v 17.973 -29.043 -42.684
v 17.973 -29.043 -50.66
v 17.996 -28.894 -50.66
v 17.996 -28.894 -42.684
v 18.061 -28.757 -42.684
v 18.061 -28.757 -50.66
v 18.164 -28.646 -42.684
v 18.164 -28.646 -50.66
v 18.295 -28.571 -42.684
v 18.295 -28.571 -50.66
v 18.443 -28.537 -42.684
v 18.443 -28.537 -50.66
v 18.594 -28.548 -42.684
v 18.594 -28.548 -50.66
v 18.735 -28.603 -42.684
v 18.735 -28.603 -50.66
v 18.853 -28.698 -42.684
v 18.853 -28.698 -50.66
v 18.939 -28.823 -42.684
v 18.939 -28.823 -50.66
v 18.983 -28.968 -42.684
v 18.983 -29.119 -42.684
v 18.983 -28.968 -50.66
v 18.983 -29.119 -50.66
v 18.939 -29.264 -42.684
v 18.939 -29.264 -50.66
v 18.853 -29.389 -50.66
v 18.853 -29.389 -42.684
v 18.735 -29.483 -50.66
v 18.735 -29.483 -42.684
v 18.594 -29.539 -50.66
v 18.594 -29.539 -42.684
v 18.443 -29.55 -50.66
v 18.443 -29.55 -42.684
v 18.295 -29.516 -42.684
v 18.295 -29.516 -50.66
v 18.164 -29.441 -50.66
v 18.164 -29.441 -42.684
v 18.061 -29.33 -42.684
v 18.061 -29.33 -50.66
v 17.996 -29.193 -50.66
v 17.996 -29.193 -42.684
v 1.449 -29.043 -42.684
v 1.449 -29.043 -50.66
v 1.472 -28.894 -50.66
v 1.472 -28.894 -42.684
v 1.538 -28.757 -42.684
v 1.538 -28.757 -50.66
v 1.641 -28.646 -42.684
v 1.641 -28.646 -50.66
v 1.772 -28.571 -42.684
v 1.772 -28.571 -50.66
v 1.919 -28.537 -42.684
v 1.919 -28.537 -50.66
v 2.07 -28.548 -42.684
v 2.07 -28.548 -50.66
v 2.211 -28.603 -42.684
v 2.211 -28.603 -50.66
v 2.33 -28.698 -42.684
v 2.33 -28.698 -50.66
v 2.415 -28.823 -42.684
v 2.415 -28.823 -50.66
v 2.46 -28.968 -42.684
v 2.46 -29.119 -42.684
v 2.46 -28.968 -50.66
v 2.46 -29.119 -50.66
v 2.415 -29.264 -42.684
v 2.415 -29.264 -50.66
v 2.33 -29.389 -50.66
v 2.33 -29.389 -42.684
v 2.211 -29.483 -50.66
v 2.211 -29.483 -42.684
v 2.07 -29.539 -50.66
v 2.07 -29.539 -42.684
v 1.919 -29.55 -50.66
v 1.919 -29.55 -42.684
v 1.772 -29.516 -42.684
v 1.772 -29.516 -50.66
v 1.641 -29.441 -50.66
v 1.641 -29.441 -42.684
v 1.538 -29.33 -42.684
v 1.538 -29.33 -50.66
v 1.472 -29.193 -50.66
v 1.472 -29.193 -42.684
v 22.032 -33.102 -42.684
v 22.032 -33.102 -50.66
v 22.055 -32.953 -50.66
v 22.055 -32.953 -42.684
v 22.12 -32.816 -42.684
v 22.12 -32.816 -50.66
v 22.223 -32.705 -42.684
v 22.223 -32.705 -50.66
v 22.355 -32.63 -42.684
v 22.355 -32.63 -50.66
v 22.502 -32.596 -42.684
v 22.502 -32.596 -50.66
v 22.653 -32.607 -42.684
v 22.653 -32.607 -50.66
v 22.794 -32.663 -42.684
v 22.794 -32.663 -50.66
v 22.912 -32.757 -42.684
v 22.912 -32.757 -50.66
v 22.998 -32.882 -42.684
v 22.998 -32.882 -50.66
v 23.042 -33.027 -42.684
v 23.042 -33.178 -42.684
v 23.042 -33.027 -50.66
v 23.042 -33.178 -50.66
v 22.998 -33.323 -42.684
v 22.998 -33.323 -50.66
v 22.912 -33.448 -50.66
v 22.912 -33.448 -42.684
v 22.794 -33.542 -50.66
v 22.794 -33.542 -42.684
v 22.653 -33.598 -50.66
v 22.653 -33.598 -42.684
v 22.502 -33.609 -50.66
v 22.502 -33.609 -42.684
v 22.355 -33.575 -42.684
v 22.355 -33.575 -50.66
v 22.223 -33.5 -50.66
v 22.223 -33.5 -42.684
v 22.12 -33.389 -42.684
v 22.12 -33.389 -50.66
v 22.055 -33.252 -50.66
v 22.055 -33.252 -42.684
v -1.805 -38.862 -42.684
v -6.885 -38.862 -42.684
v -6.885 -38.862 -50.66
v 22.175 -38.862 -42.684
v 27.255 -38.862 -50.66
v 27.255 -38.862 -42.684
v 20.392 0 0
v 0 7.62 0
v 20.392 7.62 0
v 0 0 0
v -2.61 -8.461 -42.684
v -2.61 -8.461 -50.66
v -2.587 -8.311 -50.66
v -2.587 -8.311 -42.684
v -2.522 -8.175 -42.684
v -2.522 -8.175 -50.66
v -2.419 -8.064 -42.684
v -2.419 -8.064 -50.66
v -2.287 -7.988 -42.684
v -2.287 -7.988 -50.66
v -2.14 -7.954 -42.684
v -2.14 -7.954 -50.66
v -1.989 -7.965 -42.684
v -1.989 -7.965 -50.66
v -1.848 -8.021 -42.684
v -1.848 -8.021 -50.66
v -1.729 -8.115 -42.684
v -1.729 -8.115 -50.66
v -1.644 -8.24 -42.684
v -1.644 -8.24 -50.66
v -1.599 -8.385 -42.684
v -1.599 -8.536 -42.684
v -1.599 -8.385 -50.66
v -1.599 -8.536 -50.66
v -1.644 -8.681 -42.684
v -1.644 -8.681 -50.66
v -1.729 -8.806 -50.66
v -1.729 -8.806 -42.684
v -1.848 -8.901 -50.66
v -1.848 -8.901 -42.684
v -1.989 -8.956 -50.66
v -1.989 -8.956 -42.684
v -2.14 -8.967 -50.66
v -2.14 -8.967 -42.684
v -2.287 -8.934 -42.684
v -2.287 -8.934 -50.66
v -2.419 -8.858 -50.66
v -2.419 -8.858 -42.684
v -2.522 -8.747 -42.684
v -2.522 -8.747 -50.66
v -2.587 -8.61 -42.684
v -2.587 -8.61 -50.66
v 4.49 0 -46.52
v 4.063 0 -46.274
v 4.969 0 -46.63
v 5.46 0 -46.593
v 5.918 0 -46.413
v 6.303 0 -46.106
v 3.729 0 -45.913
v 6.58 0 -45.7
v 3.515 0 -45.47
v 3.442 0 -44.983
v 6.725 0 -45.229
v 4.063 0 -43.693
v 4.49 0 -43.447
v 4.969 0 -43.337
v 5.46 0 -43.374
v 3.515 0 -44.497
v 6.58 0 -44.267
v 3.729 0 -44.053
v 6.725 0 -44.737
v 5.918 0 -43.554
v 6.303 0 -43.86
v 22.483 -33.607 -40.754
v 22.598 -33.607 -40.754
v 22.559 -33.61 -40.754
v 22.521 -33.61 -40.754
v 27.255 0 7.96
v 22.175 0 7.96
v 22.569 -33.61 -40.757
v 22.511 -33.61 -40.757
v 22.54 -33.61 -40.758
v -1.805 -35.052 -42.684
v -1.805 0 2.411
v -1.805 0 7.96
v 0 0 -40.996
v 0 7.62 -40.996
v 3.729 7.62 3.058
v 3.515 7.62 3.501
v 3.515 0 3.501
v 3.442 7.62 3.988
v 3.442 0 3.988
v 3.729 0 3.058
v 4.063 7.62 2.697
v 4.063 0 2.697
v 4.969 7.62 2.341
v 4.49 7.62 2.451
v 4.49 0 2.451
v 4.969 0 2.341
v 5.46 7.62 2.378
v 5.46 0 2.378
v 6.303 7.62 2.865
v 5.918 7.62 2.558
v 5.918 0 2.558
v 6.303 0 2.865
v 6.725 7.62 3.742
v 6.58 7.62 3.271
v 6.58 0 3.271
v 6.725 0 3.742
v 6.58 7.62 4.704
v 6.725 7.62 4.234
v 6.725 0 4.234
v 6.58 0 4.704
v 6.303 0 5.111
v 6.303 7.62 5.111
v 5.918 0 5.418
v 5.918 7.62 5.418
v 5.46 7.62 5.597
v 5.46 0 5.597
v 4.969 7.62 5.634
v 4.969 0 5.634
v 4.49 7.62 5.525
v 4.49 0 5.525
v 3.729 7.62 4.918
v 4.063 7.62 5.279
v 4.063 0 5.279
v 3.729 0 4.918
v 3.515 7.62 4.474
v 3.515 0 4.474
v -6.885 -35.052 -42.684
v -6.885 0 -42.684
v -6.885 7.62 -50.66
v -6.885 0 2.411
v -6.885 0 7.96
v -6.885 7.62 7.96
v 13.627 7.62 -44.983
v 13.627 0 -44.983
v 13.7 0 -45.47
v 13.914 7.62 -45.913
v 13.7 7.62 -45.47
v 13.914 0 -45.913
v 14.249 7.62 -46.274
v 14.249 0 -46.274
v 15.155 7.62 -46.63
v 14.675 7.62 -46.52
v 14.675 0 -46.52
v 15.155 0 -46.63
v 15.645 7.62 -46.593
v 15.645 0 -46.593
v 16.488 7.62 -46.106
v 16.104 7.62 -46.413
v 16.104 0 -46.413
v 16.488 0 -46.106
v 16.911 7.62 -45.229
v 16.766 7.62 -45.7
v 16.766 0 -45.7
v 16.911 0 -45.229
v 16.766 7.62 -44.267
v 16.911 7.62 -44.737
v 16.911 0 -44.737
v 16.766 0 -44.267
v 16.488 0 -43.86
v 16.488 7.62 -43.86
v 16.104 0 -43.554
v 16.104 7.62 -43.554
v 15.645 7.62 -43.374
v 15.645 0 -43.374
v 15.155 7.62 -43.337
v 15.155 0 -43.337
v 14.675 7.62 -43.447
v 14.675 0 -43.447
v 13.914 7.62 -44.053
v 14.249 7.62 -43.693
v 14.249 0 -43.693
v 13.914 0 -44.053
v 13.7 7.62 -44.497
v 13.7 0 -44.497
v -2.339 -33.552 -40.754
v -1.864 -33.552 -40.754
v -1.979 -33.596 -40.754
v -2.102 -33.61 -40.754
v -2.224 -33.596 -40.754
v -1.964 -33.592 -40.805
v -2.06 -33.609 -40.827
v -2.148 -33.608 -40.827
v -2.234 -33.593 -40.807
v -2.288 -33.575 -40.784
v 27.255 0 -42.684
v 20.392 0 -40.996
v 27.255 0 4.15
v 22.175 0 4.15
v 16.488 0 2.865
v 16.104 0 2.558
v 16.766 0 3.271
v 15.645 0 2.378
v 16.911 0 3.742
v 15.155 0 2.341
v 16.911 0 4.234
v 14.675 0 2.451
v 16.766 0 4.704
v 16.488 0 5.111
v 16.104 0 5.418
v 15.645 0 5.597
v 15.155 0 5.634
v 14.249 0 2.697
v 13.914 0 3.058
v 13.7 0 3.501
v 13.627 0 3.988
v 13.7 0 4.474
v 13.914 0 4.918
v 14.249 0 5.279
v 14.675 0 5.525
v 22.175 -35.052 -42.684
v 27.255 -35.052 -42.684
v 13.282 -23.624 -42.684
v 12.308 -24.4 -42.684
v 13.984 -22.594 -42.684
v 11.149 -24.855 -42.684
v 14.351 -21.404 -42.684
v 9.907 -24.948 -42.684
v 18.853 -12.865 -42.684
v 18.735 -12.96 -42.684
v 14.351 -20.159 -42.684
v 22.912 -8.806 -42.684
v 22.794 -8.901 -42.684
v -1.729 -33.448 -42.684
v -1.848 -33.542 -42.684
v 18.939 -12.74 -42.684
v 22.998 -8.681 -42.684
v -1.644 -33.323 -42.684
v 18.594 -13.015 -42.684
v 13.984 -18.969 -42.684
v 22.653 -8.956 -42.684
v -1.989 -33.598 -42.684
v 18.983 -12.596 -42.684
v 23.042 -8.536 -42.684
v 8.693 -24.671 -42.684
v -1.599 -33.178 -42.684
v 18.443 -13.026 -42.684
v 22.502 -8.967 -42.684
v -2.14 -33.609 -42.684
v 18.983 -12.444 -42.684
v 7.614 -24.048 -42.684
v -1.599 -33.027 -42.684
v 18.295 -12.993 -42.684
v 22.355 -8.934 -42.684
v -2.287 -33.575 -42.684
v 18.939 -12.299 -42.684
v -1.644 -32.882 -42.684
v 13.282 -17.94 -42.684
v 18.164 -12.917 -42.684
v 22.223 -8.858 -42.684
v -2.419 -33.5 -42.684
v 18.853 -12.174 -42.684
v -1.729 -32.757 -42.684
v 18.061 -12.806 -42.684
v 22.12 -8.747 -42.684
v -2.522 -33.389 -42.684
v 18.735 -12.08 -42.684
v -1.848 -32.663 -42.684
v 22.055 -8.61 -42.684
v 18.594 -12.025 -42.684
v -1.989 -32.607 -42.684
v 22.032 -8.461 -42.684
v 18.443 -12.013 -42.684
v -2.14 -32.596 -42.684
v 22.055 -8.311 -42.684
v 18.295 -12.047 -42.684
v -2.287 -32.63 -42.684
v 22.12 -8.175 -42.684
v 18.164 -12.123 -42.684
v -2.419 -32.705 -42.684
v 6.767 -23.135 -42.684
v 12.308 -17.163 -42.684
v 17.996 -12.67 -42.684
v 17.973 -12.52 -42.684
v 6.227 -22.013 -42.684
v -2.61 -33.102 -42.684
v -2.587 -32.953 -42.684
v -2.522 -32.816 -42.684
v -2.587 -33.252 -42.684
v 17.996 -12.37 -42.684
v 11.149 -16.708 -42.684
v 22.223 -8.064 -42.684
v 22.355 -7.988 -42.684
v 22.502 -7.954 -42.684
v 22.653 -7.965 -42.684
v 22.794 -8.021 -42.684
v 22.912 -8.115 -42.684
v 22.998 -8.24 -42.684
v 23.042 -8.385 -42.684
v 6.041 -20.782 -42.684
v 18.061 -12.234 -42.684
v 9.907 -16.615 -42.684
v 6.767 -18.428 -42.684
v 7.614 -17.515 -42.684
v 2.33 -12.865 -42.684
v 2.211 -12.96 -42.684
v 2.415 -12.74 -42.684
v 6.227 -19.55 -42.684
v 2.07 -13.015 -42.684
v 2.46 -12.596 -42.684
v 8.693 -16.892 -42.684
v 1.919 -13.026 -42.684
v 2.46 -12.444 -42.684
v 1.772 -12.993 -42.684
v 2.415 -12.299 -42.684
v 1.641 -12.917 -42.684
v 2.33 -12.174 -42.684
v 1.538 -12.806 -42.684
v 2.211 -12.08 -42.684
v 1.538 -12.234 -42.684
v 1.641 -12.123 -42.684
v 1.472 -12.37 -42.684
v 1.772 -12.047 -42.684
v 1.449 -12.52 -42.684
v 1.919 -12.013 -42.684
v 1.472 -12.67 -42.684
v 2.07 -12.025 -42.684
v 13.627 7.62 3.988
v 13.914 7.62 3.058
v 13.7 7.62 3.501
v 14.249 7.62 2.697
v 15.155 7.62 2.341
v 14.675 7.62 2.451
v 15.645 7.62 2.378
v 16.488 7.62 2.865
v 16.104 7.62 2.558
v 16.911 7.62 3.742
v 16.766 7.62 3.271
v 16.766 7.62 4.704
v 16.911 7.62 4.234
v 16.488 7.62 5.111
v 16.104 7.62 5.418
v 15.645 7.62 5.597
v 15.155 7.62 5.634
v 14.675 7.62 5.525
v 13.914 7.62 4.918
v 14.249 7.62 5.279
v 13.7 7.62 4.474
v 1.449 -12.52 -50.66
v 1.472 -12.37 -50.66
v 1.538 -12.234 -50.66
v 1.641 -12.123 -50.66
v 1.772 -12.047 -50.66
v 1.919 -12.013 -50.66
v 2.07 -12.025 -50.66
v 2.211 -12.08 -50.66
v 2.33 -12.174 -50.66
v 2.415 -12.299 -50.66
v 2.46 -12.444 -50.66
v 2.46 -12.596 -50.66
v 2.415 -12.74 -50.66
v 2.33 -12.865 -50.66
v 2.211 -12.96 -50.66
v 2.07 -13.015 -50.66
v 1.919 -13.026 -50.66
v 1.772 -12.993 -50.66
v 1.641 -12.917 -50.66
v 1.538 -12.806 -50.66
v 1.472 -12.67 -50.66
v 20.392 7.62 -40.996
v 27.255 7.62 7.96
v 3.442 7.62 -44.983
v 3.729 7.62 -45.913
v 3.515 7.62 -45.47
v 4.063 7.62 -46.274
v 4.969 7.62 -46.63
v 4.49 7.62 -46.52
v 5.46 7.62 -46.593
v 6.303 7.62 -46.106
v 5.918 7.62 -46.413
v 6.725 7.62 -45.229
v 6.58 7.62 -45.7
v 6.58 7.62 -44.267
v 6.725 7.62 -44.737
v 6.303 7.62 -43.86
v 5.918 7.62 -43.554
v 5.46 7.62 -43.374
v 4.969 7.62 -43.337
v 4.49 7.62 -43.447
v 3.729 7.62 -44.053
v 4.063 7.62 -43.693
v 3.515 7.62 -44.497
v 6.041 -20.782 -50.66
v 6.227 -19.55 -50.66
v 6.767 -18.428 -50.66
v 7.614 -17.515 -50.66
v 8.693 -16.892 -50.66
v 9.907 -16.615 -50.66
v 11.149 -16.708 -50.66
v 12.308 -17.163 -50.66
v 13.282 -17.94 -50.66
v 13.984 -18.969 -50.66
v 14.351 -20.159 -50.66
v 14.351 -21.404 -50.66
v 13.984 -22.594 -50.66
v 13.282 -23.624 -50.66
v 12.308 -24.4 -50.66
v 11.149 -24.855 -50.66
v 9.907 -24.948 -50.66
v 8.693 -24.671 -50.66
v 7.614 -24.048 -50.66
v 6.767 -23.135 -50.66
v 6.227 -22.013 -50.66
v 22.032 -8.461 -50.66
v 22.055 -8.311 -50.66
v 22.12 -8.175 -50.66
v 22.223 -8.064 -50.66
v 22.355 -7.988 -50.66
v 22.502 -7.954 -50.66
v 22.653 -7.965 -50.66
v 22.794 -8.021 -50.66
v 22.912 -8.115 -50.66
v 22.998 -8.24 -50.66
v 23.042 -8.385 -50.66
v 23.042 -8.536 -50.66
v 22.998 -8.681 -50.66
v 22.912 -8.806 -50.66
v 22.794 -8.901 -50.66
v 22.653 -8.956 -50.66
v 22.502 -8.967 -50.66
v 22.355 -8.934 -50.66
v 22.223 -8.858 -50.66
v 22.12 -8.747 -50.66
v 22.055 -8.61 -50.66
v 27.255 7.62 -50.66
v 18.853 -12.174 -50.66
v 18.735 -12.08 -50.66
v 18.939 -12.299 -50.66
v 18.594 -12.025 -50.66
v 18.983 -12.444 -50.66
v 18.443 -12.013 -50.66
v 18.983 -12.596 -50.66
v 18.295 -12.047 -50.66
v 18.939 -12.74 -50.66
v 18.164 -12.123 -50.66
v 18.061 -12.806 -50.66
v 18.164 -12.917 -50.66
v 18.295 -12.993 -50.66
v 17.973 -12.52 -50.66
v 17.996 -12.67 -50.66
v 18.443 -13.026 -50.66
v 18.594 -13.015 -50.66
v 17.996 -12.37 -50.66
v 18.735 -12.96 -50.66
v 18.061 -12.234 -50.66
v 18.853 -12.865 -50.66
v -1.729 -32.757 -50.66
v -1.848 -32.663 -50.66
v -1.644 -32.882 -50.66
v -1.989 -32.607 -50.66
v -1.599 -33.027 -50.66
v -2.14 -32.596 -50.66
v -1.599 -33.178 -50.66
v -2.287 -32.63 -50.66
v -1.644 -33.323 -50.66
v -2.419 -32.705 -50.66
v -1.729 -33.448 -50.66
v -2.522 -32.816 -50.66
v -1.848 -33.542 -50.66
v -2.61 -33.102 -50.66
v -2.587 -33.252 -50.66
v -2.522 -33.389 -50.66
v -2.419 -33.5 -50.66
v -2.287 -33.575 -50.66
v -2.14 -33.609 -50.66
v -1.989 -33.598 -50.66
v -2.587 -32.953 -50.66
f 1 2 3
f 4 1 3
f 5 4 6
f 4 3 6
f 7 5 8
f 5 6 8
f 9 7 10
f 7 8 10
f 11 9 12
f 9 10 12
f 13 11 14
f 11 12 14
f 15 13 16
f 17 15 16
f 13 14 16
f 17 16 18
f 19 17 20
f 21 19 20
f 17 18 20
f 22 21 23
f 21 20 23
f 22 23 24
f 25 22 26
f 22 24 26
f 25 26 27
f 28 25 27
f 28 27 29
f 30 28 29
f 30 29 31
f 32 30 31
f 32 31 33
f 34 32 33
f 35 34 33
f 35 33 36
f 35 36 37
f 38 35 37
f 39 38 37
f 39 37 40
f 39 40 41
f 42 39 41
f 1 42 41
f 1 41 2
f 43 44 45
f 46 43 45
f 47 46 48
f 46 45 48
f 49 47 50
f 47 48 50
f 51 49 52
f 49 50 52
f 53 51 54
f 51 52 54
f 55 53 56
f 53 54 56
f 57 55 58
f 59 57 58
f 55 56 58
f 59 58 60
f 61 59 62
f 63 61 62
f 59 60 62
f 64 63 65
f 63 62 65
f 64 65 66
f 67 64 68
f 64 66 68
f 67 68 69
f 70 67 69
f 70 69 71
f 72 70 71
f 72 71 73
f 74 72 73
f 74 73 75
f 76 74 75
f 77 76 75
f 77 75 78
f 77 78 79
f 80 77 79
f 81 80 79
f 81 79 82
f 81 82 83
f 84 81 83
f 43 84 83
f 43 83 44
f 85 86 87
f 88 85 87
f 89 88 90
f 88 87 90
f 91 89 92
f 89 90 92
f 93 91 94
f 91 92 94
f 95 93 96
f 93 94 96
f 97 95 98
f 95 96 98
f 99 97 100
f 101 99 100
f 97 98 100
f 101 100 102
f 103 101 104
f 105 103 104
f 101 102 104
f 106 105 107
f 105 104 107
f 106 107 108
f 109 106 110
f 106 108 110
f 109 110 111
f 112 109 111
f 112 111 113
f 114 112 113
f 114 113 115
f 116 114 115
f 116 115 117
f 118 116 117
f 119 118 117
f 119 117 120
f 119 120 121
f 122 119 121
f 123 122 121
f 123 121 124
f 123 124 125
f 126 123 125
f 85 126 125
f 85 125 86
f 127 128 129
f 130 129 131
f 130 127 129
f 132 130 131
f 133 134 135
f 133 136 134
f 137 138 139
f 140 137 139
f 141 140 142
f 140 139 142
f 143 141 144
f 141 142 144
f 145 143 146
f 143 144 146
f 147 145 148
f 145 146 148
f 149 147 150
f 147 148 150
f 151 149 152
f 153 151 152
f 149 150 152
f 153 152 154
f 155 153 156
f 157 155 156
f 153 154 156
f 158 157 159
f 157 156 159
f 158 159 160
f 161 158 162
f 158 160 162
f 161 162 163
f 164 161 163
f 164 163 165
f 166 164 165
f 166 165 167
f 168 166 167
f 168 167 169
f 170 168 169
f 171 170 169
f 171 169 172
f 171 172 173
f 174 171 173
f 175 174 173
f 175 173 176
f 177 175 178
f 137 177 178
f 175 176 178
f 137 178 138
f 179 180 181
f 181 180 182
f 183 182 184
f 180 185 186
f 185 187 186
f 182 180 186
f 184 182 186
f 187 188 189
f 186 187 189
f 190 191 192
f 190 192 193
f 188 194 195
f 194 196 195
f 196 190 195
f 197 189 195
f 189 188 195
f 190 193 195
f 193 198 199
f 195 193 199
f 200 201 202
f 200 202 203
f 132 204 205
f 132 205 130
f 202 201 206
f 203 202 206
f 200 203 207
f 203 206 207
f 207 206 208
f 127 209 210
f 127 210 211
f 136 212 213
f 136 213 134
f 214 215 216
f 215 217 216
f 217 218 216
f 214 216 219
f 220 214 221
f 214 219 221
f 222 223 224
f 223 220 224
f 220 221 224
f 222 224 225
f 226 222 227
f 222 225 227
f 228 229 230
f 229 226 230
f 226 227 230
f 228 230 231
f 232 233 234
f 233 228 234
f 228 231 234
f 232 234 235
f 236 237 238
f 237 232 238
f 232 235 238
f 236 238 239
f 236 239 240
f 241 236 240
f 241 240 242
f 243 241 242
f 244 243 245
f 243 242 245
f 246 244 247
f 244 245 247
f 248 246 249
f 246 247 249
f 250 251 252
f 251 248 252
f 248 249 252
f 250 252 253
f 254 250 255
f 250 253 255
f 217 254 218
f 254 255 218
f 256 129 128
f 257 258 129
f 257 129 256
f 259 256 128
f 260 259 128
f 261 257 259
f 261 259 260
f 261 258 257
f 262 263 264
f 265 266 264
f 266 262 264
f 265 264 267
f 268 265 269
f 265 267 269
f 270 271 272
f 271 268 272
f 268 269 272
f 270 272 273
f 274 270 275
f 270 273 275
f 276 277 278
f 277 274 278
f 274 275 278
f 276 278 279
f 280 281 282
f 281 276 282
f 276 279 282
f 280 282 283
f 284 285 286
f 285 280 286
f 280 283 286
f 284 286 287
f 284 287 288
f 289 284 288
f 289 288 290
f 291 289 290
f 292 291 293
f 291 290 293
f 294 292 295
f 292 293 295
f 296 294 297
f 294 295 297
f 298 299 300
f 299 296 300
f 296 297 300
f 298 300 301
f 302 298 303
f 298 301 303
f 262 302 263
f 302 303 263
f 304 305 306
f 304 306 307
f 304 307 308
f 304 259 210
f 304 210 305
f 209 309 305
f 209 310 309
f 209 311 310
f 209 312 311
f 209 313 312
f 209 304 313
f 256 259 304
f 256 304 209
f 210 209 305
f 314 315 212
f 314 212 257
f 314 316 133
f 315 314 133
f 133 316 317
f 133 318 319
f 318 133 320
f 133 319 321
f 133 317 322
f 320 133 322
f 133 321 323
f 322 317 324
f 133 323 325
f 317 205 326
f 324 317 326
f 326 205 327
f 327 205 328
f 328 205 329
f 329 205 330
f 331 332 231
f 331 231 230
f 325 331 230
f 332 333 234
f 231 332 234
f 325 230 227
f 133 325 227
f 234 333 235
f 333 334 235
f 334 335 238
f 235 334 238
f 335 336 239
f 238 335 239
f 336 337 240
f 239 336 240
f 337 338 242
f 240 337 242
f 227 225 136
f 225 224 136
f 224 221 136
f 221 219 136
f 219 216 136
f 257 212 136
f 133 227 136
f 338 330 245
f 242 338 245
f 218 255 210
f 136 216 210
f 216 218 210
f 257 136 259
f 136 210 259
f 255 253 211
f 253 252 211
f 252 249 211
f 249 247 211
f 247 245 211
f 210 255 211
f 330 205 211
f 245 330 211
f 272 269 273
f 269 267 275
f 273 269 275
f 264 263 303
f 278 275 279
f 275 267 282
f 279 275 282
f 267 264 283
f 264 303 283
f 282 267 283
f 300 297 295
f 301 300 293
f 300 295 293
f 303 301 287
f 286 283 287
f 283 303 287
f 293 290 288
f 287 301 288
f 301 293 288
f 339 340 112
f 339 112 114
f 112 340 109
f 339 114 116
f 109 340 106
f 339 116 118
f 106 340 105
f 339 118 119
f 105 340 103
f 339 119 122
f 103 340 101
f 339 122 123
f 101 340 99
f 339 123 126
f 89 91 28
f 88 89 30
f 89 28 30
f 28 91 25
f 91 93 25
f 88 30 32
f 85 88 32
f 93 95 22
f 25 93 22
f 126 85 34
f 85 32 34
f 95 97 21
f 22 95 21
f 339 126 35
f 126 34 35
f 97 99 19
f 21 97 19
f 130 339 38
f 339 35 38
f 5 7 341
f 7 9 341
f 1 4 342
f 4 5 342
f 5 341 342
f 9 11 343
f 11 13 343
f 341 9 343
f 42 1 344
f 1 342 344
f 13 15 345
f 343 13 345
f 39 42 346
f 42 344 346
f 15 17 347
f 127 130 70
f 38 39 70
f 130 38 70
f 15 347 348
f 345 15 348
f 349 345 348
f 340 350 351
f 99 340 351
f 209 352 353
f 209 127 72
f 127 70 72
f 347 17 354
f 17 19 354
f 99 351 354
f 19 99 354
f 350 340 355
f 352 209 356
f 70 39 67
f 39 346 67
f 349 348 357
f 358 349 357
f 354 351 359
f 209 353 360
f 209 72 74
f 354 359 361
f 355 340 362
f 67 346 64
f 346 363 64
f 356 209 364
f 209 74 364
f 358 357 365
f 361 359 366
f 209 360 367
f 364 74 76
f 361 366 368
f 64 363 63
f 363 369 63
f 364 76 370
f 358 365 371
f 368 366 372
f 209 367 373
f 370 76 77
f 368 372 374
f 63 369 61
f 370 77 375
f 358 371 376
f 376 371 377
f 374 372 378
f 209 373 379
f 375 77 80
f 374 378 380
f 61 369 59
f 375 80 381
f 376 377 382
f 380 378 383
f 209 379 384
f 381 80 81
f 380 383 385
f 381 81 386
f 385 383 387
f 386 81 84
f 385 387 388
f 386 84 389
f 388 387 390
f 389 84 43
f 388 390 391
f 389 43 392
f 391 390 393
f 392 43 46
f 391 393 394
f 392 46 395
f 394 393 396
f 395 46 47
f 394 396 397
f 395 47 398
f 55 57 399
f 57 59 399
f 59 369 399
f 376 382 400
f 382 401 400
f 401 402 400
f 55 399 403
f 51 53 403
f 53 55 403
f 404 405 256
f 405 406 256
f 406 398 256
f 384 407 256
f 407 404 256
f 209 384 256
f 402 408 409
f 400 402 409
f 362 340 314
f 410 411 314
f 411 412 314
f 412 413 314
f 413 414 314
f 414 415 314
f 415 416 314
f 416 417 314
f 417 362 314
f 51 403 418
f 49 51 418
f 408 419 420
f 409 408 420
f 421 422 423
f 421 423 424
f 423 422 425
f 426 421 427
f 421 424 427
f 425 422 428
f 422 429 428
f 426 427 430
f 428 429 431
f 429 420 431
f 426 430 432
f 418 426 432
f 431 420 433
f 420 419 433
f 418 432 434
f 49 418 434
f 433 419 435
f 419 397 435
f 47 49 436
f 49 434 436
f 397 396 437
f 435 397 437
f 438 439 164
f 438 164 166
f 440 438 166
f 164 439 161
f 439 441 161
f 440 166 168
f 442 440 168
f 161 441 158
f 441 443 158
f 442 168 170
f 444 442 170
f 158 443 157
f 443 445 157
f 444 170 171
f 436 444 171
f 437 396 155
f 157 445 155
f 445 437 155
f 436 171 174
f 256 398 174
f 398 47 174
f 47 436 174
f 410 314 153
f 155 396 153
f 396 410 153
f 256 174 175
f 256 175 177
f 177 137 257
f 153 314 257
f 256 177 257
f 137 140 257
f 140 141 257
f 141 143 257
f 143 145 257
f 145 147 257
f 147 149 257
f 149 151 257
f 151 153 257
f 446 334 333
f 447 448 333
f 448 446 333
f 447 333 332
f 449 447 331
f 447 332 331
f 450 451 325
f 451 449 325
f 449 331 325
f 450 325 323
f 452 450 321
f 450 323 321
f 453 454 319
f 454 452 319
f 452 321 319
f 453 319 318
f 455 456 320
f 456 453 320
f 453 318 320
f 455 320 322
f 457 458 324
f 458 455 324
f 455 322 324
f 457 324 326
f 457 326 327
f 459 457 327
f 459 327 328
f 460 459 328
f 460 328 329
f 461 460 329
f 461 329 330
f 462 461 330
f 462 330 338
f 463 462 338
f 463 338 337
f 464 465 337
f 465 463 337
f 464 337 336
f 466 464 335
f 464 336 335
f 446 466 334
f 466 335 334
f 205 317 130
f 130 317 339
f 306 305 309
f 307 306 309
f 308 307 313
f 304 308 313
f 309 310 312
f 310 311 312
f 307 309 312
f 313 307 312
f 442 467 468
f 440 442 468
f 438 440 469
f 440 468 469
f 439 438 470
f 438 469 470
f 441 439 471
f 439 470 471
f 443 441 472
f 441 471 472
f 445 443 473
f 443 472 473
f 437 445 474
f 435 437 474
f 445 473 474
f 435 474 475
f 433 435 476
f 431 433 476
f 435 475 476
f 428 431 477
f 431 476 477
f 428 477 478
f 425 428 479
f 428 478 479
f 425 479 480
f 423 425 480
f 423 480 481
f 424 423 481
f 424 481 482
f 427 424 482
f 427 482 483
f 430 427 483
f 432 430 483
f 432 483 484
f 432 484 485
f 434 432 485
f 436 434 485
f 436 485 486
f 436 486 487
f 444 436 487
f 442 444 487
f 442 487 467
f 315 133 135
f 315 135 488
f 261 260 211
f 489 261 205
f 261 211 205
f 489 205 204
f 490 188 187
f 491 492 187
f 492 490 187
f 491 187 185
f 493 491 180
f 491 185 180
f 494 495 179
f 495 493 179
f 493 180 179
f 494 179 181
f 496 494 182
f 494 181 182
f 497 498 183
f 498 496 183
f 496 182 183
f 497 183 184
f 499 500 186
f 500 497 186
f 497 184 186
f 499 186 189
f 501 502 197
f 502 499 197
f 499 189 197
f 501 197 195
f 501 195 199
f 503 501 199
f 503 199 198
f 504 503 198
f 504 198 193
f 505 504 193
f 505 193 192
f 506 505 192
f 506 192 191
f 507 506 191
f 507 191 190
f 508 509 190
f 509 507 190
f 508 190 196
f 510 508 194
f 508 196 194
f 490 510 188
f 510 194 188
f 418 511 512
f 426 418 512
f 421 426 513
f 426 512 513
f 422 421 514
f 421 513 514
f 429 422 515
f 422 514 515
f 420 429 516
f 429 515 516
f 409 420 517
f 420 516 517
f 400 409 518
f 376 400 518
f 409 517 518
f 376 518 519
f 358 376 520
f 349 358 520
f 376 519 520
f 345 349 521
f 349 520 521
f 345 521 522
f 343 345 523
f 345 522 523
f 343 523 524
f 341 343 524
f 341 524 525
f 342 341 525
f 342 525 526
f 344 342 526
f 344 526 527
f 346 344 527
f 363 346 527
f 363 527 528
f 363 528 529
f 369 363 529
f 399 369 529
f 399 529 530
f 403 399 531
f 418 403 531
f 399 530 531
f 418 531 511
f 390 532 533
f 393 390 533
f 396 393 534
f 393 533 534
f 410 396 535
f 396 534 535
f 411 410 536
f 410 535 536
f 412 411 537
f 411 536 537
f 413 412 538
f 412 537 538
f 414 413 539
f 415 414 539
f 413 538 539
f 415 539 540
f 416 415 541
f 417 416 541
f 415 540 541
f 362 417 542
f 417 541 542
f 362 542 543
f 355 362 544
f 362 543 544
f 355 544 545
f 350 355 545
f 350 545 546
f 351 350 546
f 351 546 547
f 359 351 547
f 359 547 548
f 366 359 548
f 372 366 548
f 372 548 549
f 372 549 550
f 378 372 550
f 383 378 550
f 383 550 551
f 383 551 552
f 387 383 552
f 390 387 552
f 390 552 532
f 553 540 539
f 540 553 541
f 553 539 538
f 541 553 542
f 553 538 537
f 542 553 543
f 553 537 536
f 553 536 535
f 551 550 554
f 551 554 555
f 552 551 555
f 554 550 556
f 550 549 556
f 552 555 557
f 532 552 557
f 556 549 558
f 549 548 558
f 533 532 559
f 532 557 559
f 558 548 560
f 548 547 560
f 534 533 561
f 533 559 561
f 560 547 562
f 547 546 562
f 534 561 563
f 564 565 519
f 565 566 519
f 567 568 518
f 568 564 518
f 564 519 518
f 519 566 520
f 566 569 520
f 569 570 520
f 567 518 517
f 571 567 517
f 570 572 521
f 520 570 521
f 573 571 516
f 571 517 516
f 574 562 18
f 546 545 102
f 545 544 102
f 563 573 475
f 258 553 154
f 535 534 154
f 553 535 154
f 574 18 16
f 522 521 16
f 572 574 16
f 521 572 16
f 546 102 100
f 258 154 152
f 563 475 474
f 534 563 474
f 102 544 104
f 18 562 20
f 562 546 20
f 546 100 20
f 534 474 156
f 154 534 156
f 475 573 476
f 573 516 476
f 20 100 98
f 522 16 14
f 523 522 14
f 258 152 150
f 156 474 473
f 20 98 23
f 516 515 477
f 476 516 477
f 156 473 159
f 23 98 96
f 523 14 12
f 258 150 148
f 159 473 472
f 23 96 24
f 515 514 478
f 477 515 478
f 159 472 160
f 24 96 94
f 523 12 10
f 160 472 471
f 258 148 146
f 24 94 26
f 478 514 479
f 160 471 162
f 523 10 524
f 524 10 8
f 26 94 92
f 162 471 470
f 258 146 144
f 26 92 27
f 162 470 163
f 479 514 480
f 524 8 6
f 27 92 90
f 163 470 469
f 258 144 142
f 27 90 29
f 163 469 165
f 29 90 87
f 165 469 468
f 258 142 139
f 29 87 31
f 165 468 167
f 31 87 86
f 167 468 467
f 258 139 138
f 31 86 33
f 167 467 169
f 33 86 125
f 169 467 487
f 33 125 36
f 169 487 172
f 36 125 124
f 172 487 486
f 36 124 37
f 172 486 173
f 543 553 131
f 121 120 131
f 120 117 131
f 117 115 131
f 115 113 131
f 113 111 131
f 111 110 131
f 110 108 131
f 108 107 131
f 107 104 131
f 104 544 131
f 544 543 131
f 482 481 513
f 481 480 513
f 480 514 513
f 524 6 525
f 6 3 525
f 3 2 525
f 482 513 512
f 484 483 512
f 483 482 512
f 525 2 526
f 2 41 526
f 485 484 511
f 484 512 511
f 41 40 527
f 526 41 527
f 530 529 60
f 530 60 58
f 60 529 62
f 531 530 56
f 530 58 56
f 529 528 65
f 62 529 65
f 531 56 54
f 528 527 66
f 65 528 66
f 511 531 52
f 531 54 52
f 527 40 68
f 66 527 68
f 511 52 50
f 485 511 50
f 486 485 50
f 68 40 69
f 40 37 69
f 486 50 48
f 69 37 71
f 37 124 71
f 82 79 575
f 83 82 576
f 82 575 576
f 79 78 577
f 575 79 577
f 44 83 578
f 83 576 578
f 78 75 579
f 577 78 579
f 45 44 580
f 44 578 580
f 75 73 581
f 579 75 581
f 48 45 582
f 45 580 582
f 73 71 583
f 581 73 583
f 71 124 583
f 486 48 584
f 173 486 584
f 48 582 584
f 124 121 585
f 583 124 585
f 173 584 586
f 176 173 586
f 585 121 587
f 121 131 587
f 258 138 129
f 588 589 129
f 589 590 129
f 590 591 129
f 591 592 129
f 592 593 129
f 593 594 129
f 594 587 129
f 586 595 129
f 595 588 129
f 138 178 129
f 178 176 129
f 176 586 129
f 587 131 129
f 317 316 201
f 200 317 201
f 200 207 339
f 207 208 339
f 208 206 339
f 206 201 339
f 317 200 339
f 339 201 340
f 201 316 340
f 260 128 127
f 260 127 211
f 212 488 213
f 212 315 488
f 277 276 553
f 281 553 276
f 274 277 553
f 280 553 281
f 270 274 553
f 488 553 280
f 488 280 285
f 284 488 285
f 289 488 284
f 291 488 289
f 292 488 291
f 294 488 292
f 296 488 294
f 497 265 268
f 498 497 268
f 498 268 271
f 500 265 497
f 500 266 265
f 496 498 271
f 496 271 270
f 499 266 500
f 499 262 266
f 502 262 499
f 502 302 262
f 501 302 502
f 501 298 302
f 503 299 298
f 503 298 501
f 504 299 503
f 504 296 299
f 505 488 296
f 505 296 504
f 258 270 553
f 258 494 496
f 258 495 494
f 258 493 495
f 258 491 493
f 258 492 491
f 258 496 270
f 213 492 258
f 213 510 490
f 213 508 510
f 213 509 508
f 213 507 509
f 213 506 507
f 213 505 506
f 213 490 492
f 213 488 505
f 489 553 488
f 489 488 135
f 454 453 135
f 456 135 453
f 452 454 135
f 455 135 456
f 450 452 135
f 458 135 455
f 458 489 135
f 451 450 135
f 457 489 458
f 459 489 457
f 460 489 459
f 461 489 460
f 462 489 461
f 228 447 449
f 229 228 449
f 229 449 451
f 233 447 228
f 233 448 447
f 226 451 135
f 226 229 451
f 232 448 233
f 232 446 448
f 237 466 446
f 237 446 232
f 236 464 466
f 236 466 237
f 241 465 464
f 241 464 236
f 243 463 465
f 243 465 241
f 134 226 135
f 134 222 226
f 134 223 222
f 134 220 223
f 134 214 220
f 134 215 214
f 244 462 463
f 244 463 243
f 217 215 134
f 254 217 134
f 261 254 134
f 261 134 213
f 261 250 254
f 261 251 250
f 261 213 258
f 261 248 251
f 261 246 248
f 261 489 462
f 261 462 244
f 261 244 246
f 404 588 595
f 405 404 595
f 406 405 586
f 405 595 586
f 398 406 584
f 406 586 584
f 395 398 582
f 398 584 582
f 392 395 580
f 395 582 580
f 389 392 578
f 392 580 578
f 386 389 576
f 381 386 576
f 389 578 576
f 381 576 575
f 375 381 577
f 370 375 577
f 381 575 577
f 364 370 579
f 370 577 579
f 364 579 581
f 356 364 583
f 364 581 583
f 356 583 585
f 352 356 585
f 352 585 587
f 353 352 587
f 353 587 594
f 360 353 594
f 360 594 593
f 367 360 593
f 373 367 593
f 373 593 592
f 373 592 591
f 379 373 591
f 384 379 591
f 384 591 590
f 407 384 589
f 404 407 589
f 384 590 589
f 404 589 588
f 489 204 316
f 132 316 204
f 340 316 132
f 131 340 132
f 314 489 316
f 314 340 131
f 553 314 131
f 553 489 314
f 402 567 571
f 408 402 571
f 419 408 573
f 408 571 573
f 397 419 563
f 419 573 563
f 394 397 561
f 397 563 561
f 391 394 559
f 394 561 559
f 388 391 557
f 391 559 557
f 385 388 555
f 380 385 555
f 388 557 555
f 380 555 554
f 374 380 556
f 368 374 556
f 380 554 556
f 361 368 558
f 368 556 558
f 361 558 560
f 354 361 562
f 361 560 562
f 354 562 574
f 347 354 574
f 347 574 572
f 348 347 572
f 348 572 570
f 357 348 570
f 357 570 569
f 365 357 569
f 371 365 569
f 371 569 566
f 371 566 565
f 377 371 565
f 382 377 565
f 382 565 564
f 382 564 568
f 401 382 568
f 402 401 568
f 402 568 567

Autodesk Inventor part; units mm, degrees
ref_plane "YZ Plane" through (0, 0, 0) normal (1, 0, 0) x (0, 1, 0)
ref_plane "XZ Plane" through (0, 0, 0) normal (0, 1, 0) x (-1, 0, 0)
ref_plane "XY Plane" through (0, 0, 0) normal (0, 0, 1) x (1, 0, 0)
sketch "Sketch1" plane through (0, 0, 0) normal (0, 1, 0) x (-1, 0, 0)
  line L0 (0, 0) -> (-20.3922, 0)
  line L1 (-20.3922, 0) -> (-20.3922, -40.9956)
  line L2 (-20.3922, -40.9956) -> (0, -40.9956)
  line L3 (0, -40.9956) -> (0, 0)
  line L4 (1.8083, 7.7679) -> (6.8846, 7.9604)
  line L5 (-22.5838, -48.6642) -> (-27.2554, -50.6597)
  line L6 (6.8846, 7.9604) -> (-27.2554, 7.9604)
  line L7 (-27.2554, 7.9604) -> (-27.2554, -50.6597)
  line L8 (-27.2554, -50.6597) -> (6.8846, -50.6597)
  line L9 (6.8846, -50.6597) -> (6.8846, 7.9604)
  circle A0 centre (-5.0927, 3.9878) radius 1.651
  circle A1 centre (-15.2781, 3.9878) radius 1.651
  circle A2 centre (-5.0927, -44.9834) radius 1.651
  circle A3 centre (-15.2781, -44.9834) radius 1.651
  dimension "d0" = 40.9956
  dimension "d2" = 7.9756
  dimension "d3" = 5.08
  dimension "d4" = 7.9756
  dimension "d5" = 5.08
  dimension "d6" = 3.302
  dimension "d7" = 3.302
  dimension "d8" = 3.302
  dimension "d9" = 3.302
  dimension "d24" = 6.8846
  dimension "d25" = 6.8633
extrude "Extrusion1" add sketch "Sketch1" along normal blind 7.62
sketch "Sketch2" plane through (0, 0, 0) normal (0, -1, 0) x (1, 0, 0)
  line L0 (27.2554, 7.9604) -> (27.2554, -50.6597) projected
  line L1 (27.2554, -42.6841) -> (-6.8846, -42.6841)
  line L2 (-6.8846, -42.6841) -> (-6.8846, -50.6597)
  line L3 (-6.8846, -50.6597) -> (27.2554, -50.6597)
  line L4 (27.2554, -50.6597) -> (27.2554, -42.6841)
  point P0 (0, 0)
extrude "Extrusion2" add sketch "Sketch2" along normal blind 38.862
sketch "Sketch3" plane through (27.2554, 0, 7.9604) normal (1, 0, 0) x (0, 0, -1)
  line L0 (0, 0) -> (50.6445, -38.862)
  line L1 (50.6445, -38.862) -> (50.6445, -35.052)
  line L2 (50.6445, 0) -> (50.6445, -38.862) projected
  line L3 (0, 0) -> (3.81, 0)
  line L4 (0, 0) -> (50.6445, 0) projected
  line L5 (3.81, 0) -> (50.6445, -35.052)
  point P0 (7.9604, 0)
  dimension "d14" = 3.81
  dimension "d15" = 3.81
extrude "Extrusion3" add sketch "Sketch3" against normal blind 5.08 contours L3 L5 L1 L0
sketch "Sketch4" plane through (-6.8846, 0, -42.6841) normal (-1, 0, 0) x (0, 0, 1)
  line L0 (0, -38.862) -> (0, -35.052)
  line L1 (0, 0) -> (0, -38.862) projected
  line L2 (48.9049, 0) -> (45.0949, 0)
  line L3 (0, 0) -> (50.6445, 0) projected
  line L4 (45.0949, 0) -> (0, -35.052)
  line L5 (0, -38.862) -> (50.6445, 0)
  line L6 (50.6445, 0) -> (45.0949, 0)
  point P0 (42.6841, 0)
  dimension "d18" = 3.81
  dimension "d19" = 3.81
extrude "Extrusion4" add sketch "Sketch4" against normal blind 5.08 contours L0 L4 L2 L3 L5
sketch "Sketch5" plane through (27.2554, 7.62, -50.6597) normal (0, 0, -1) x (-1, 0, 0)
  line L0 (2.6344, -13.9998) -> (31.438, -13.9998)
  line L1 (31.438, -13.9998) -> (31.438, -42.8034)
  line L2 (31.438, -42.8034) -> (2.6344, -42.8034)
  line L3 (2.6344, -42.8034) -> (2.6344, -13.9998)
  line L4 (31.438, -13.9998) -> (2.6344, -42.8034)
  line L5 (2.6344, -13.9998) -> (31.438, -42.8034)
  line L6 (17.0362, -28.4016) -> (25.2981, -20.1398)
  line L7 (17.0362, -28.4016) -> (8.7744, -20.1398)
  line L8 (17.0362, -28.4016) -> (8.7744, -36.6634)
  line L9 (17.0362, -28.4016) -> (25.2981, -36.6634)
  line L10 (17.0362, -28.4016) -> (29.3572, -16.0807)
  line L11 (17.0362, -28.4016) -> (4.7153, -16.0807)
  line L12 (17.0362, -28.4016) -> (4.7153, -40.7225)
  line L13 (17.0362, -28.4016) -> (29.3572, -40.7225)
  circle A0 centre (25.2981, -20.1398) radius 0.508
  circle A1 centre (29.3572, -16.0807) radius 0.508
  circle A2 centre (4.7153, -16.0807) radius 0.508
  circle A3 centre (8.7744, -20.1398) radius 0.508
  circle A4 centre (8.7744, -36.6634) radius 0.508
  circle A5 centre (4.7153, -40.7225) radius 0.508
  line L14 (17.0362, -28.4016) -> (25.2981, -36.6634)
  circle A6 centre (25.2981, -36.6634) radius 0.508
  circle A7 centre (29.3572, -40.7225) radius 0.508
  circle A8 centre (17.0362, -28.4016) radius 4.1783
  point P0 (27.2554, -7.62)
  dimension "d22" = 28.8036
  dimension "d26" = 28.8036
  dimension "d27" = 11.684
  dimension "d28" = 11.684
  dimension "d29" = 11.684
  dimension "d30" = 17.4244
  dimension "d31" = 17.4244
  dimension "d32" = 17.4244
  dimension "d33" = 17.4244
  dimension "d34" = 1.016
  dimension "d35" = 1.016
  dimension "d36" = 1.016
  dimension "d37" = 1.016
  dimension "d38" = 1.016
  dimension "d39" = 1.016
  dimension "d40" = 11.684
  dimension "d41" = 1.016
  dimension "d42" = 1.016
  dimension "d43" = 8.3566
extrude "Extrusion5" cut sketch "Sketch5" against normal blind 9.906 contours A2 L5 | L5 A2 | A1 L4 | L4 A1 | A5 L4 | L4 A5 | A7 L5 | L5 A7 | A3 L5 | L5 A3 | A0 L4 | L4 A0 | A4 L4 | L4 A4 | A6 L5 | L5 A6 | A8 L4 L5 | L5 L4 A8 | A8 L5 L4 | L4 L5 A8
